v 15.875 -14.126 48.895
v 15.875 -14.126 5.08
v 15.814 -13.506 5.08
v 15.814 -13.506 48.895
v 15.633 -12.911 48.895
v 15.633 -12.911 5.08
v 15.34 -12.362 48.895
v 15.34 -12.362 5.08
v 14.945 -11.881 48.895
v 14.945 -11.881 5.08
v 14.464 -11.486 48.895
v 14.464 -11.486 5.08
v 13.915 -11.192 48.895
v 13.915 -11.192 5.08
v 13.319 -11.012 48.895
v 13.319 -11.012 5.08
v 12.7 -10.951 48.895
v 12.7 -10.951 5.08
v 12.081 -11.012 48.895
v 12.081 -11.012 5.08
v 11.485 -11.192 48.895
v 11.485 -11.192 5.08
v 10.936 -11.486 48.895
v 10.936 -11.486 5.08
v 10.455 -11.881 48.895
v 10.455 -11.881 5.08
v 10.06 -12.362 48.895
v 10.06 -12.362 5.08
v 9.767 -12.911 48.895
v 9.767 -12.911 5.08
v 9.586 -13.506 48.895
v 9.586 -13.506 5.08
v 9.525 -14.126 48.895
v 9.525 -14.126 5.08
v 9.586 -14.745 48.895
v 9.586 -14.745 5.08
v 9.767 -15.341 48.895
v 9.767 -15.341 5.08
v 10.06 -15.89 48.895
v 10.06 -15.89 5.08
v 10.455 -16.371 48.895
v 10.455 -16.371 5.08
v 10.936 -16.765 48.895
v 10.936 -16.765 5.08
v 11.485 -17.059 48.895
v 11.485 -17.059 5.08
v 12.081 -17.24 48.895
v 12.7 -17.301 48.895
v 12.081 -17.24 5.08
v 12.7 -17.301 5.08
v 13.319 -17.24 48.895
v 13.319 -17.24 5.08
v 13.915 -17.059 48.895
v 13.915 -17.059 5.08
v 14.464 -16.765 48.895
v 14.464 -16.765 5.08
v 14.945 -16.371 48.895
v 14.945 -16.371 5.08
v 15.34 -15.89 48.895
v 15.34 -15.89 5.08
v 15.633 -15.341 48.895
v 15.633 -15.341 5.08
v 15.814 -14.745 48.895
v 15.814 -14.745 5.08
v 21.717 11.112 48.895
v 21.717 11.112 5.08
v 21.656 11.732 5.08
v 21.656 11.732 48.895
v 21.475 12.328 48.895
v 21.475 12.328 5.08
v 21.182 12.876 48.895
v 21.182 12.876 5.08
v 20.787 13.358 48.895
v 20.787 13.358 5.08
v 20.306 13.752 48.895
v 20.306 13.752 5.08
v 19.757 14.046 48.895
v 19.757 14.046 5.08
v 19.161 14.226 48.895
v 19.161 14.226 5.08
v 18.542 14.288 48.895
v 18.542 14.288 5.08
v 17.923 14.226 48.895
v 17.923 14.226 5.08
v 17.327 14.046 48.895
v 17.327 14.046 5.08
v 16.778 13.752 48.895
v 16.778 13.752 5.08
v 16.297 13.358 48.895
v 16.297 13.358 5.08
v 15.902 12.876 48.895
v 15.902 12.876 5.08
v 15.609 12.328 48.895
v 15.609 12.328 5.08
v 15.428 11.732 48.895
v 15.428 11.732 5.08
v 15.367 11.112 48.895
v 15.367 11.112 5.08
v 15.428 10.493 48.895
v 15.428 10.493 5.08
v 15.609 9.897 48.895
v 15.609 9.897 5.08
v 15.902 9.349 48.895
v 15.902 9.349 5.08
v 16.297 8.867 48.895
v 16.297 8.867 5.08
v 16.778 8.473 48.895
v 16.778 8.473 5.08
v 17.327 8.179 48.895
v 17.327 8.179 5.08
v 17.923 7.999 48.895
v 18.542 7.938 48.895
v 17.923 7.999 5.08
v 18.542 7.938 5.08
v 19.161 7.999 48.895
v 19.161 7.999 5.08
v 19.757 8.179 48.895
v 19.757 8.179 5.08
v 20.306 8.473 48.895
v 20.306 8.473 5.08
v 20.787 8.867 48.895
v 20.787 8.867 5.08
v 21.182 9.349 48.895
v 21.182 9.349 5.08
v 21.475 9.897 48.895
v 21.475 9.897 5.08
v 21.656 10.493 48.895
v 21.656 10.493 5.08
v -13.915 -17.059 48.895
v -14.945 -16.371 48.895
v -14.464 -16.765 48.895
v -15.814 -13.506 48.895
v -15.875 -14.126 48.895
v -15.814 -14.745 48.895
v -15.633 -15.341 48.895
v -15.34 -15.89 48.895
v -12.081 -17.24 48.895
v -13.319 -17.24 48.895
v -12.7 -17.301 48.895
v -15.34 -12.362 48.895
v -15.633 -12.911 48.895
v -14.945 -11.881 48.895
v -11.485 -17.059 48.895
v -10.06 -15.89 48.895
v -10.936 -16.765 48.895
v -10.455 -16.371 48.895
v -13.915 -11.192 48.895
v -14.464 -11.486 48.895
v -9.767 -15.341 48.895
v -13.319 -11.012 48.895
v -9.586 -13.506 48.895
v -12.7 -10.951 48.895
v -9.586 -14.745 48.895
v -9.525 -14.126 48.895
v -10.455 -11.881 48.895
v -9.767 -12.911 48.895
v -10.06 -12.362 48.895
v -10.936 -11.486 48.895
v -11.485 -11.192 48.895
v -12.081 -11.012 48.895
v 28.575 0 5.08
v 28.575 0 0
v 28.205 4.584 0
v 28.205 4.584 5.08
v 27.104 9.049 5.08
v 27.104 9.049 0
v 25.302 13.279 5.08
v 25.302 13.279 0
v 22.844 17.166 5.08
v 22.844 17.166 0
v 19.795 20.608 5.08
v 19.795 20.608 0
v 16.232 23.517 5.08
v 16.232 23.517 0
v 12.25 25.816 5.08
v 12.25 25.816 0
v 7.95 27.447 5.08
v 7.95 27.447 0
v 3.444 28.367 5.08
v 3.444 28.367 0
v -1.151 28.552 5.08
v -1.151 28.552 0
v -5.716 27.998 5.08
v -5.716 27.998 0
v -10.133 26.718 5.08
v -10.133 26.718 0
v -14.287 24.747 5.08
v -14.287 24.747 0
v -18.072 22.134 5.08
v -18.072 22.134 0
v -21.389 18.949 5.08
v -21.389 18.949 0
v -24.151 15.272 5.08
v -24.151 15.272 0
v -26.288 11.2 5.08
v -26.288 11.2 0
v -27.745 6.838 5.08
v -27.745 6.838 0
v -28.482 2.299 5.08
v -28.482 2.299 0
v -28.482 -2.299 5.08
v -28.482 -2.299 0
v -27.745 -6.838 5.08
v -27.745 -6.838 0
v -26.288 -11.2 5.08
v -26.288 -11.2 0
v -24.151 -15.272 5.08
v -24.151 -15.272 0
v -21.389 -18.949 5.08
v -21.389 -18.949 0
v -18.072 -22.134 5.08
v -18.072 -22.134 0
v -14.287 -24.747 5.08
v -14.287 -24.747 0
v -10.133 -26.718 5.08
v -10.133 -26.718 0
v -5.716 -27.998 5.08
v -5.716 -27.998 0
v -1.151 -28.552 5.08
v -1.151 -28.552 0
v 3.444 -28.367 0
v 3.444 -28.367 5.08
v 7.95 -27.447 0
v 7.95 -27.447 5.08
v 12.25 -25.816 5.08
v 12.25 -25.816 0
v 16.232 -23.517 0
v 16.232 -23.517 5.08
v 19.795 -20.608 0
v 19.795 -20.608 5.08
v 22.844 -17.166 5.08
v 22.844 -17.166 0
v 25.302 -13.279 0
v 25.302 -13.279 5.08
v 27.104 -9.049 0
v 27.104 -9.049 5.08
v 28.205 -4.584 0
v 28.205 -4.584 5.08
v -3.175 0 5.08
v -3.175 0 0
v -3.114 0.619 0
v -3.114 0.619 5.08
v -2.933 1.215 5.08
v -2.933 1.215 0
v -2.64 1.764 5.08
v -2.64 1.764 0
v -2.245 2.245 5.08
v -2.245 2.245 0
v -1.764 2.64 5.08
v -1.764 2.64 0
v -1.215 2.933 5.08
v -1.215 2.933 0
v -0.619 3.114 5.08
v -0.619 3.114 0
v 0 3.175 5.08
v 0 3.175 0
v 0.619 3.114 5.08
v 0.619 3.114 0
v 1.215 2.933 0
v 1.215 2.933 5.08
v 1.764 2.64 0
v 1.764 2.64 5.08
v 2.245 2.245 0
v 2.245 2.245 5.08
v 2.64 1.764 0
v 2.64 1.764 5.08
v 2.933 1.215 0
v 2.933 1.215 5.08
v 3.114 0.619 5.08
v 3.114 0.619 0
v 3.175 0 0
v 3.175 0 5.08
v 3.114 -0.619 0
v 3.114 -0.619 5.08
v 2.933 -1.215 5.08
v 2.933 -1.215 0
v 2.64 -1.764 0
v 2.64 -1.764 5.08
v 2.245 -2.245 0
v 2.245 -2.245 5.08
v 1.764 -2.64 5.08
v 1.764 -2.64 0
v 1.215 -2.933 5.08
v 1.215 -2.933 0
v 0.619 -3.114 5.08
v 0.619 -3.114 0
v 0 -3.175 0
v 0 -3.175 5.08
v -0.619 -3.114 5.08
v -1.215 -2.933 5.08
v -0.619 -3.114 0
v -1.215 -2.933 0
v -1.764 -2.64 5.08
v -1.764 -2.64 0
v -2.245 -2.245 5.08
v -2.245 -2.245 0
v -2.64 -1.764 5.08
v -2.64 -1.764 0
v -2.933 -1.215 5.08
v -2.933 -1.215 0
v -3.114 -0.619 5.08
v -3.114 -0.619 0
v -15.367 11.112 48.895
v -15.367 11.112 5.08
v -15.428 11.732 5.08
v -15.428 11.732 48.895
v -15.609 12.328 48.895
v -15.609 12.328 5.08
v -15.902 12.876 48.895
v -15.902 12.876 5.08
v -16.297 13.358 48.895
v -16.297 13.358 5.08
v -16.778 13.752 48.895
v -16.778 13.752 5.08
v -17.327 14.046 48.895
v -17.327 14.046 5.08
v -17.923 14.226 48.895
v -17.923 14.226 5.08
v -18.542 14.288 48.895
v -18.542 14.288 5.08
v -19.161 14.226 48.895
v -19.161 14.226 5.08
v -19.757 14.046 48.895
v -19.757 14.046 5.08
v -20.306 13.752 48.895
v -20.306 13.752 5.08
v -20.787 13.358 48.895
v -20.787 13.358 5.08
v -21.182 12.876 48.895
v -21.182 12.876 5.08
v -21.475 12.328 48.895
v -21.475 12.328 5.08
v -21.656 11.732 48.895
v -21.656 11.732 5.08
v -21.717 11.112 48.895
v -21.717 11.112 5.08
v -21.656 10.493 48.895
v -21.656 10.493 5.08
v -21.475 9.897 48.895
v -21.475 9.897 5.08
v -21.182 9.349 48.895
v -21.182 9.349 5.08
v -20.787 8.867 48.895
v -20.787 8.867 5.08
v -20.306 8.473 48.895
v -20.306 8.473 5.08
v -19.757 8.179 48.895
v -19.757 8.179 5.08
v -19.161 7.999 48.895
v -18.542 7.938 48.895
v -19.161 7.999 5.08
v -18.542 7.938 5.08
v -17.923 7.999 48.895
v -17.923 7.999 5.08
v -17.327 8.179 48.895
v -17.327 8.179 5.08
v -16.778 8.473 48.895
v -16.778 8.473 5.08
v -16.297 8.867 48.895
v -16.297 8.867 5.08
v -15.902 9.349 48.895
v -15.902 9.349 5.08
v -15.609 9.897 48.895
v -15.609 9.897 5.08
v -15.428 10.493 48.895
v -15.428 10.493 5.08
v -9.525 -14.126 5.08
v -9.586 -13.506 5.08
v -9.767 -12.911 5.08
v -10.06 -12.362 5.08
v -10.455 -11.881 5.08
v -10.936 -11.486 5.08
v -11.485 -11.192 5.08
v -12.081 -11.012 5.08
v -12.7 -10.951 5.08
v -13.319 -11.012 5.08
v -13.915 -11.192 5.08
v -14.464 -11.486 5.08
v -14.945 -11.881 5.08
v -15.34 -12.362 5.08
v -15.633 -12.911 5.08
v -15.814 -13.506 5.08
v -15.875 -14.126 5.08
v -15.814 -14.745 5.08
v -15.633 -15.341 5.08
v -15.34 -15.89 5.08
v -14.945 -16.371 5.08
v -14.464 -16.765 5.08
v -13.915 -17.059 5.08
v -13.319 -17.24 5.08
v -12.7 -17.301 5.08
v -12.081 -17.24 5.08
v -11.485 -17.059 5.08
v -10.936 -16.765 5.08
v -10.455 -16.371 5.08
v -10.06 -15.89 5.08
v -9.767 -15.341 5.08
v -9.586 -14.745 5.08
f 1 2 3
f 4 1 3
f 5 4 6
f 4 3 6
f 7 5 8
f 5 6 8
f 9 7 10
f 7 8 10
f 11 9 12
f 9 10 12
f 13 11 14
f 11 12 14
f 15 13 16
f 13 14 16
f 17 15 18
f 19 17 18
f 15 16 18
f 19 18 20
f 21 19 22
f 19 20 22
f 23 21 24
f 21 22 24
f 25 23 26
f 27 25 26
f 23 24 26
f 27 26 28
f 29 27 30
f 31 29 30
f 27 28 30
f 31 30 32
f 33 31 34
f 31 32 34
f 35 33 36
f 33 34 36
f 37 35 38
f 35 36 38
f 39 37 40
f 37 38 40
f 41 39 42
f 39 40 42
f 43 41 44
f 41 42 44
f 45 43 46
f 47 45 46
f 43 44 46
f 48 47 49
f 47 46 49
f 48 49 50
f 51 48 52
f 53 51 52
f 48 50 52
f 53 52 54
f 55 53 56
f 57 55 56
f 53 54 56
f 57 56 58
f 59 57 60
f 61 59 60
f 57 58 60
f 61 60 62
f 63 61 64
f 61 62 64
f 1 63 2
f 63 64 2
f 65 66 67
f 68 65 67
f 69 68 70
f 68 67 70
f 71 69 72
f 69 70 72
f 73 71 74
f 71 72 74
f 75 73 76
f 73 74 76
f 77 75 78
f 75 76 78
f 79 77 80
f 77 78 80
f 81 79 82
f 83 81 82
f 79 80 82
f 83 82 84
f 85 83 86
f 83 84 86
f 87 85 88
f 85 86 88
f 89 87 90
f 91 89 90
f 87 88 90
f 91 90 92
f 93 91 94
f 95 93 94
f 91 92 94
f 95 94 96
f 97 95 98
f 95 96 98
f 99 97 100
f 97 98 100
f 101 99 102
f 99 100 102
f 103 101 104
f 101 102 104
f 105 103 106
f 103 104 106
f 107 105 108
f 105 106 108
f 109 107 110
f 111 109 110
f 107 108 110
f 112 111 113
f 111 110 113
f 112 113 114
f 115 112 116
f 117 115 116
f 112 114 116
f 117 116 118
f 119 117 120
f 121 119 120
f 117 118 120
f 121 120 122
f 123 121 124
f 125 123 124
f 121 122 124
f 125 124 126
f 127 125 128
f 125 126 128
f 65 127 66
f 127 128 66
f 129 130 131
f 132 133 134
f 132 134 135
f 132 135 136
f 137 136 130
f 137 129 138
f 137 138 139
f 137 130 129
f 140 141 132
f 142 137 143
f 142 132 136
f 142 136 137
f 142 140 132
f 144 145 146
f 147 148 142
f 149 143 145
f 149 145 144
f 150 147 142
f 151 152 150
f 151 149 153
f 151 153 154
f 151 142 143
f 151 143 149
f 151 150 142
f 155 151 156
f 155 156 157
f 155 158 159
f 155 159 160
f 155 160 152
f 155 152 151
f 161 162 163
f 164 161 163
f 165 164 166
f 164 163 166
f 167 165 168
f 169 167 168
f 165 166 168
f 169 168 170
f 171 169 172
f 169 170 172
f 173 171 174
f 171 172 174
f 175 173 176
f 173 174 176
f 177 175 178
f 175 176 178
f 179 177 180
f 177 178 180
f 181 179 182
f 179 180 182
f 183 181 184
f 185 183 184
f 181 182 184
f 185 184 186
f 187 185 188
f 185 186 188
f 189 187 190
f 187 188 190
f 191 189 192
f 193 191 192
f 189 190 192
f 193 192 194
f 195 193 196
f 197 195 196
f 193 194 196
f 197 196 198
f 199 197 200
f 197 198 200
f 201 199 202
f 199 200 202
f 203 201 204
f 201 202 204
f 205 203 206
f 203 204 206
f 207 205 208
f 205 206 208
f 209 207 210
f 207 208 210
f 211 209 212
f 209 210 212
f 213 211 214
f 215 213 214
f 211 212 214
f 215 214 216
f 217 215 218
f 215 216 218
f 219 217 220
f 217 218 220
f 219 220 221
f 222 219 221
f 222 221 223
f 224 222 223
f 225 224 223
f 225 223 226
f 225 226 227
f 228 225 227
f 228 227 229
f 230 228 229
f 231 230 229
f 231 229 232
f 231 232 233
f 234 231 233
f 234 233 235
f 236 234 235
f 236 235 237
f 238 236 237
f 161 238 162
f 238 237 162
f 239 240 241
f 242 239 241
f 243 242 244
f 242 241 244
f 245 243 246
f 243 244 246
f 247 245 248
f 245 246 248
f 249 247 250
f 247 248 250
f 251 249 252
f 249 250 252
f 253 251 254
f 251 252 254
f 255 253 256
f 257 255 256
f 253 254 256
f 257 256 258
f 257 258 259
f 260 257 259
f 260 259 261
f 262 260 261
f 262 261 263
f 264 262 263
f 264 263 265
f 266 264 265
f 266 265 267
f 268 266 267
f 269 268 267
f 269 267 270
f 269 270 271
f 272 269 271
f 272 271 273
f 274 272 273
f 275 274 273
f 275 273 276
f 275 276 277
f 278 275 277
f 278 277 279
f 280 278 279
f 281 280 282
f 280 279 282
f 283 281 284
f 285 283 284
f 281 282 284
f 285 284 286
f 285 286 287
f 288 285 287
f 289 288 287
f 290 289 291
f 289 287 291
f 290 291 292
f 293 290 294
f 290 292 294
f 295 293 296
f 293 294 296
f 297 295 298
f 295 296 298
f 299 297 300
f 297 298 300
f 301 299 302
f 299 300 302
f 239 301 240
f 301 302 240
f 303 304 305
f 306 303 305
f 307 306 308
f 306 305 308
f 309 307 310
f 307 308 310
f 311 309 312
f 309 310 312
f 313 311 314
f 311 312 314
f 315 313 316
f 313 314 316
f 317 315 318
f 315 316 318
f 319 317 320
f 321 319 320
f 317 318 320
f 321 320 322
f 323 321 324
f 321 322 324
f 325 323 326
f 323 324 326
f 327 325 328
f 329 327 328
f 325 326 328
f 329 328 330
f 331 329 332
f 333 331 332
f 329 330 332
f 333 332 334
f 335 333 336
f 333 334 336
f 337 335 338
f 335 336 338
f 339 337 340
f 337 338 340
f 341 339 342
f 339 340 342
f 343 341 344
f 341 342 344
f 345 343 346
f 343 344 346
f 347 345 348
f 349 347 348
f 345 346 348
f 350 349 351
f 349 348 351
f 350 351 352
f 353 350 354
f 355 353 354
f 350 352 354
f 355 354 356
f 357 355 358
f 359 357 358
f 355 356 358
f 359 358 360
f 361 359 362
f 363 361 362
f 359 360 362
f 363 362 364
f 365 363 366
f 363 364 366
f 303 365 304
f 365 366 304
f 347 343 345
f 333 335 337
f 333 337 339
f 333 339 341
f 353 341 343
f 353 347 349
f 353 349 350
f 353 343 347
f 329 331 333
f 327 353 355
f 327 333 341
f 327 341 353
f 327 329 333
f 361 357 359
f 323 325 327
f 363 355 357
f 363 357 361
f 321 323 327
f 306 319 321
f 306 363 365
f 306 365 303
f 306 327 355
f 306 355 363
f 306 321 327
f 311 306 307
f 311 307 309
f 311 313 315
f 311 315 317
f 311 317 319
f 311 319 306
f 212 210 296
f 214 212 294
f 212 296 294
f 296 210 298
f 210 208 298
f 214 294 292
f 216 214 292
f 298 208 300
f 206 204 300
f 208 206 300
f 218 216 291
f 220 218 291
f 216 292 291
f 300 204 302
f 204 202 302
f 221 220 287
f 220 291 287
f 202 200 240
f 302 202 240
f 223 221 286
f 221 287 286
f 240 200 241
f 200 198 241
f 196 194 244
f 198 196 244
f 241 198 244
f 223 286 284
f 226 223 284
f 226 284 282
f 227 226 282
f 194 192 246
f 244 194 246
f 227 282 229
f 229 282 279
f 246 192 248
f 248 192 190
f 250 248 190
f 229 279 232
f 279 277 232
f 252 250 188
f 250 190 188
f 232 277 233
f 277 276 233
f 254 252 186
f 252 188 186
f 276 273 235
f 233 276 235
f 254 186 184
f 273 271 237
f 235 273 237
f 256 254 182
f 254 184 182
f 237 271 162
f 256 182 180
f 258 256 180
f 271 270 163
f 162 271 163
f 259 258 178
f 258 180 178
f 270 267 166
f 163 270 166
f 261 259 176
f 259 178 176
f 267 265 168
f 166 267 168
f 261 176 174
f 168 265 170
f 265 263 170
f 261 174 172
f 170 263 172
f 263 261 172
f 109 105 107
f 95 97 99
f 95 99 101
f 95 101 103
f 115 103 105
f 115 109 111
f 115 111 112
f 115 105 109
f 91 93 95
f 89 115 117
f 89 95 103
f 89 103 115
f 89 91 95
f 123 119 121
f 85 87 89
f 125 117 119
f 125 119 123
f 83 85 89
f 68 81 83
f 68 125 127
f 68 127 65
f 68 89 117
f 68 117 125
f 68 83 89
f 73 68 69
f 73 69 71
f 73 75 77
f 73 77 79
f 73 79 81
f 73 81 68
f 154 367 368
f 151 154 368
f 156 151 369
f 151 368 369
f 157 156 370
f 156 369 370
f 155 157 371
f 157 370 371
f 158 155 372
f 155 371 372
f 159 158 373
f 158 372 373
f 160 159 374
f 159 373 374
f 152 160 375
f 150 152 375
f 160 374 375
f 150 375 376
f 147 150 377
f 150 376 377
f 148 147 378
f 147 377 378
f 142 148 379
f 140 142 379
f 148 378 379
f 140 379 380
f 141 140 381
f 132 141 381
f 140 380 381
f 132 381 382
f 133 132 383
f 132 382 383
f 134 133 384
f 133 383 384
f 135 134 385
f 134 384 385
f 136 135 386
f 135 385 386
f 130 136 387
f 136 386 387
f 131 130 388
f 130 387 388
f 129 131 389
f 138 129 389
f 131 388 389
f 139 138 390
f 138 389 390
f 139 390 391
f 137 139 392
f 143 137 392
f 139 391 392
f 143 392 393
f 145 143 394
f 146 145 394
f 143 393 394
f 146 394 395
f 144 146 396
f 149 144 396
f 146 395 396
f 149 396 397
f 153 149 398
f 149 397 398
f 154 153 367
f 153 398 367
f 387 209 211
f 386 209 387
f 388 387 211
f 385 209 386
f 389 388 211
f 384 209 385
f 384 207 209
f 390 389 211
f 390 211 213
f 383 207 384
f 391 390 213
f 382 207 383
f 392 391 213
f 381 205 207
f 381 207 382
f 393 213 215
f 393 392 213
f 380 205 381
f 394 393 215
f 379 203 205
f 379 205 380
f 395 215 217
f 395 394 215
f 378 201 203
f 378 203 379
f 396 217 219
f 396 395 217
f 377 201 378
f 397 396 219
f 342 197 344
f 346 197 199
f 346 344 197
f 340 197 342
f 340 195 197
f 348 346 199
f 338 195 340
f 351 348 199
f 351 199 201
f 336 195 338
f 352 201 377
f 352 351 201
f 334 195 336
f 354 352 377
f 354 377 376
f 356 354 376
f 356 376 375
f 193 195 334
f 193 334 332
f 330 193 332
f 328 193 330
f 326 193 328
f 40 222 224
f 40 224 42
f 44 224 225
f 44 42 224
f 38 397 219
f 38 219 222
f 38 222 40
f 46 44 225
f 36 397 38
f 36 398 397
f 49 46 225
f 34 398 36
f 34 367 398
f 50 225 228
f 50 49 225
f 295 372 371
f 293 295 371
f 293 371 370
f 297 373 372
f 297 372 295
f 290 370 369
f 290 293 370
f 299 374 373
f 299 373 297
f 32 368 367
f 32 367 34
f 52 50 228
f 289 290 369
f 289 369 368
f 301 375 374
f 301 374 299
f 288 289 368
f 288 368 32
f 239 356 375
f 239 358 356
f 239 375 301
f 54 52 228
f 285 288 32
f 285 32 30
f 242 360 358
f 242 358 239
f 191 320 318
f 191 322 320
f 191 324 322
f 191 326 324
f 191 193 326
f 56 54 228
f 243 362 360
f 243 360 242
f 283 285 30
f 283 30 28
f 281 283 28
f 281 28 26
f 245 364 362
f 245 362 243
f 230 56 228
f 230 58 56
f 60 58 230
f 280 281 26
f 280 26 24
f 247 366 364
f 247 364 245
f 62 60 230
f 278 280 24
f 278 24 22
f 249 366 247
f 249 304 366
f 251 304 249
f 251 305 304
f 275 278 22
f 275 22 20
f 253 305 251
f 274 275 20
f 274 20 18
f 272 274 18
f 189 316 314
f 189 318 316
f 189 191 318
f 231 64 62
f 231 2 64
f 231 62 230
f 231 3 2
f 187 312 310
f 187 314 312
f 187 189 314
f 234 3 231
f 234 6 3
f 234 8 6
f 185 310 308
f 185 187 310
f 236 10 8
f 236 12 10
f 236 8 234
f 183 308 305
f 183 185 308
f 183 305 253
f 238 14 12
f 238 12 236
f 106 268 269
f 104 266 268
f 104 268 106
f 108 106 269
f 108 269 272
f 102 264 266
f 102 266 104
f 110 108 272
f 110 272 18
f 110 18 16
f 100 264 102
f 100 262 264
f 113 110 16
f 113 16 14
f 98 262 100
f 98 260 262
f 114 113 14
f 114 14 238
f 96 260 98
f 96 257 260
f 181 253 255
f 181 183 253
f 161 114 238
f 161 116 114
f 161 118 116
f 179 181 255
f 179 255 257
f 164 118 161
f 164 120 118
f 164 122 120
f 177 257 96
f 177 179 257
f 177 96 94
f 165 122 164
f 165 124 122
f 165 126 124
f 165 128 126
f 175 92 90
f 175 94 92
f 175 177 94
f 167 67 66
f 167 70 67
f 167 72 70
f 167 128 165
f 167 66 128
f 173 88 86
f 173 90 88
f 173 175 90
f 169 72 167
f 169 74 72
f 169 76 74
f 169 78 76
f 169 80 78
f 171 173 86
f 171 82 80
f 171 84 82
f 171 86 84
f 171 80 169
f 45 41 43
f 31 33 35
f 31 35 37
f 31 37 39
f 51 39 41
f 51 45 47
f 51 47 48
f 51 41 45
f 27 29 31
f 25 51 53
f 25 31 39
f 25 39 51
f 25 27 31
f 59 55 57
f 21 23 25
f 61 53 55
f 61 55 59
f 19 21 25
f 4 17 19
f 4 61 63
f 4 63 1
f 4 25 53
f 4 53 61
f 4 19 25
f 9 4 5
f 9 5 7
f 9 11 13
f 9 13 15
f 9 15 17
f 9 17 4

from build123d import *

# Parameters (mm, degrees)
SKETCH1_R           = 28.575
BOSS_EXTRUDE1_DEPTH = 5.08
SKETCH2_R           = 3.175
BOSS_EXTRUDE2_DEPTH = 43.815
SKETCH6_R           = 3.175
CUT_EXTRUDE2_DEPTH  = 49.895


with BuildPart() as part:
    # Sketch1 → Boss-Extrude1 (new body)
    with BuildSketch(Plane.XY):
        Circle(SKETCH1_R)
    extrude(amount=BOSS_EXTRUDE1_DEPTH)

    # Sketch2 → Boss-Extrude2 (add)
    with BuildSketch(Plane.XY.offset(5.08)):
        with Locations((-18.542, 11.1125)):
            Circle(SKETCH2_R)
        with Locations((18.542, 11.1125)):
            Circle(SKETCH2_R)
        with Locations((-12.7, -14.125569529)):
            Circle(SKETCH2_R)
        with Locations((12.7, -14.125569529)):
            Circle(SKETCH2_R)
    extrude(amount=BOSS_EXTRUDE2_DEPTH)

    # Sketch6 → Cut-Extrude2 (cut, through all)
    with BuildSketch(Plane(origin=(0, 0, 0), x_dir=(-1, 0, 0), z_dir=(0, 0, -1))):
        Circle(SKETCH6_R)
    extrude(amount=-CUT_EXTRUDE2_DEPTH, mode=Mode.SUBTRACT)


solid = part.part
